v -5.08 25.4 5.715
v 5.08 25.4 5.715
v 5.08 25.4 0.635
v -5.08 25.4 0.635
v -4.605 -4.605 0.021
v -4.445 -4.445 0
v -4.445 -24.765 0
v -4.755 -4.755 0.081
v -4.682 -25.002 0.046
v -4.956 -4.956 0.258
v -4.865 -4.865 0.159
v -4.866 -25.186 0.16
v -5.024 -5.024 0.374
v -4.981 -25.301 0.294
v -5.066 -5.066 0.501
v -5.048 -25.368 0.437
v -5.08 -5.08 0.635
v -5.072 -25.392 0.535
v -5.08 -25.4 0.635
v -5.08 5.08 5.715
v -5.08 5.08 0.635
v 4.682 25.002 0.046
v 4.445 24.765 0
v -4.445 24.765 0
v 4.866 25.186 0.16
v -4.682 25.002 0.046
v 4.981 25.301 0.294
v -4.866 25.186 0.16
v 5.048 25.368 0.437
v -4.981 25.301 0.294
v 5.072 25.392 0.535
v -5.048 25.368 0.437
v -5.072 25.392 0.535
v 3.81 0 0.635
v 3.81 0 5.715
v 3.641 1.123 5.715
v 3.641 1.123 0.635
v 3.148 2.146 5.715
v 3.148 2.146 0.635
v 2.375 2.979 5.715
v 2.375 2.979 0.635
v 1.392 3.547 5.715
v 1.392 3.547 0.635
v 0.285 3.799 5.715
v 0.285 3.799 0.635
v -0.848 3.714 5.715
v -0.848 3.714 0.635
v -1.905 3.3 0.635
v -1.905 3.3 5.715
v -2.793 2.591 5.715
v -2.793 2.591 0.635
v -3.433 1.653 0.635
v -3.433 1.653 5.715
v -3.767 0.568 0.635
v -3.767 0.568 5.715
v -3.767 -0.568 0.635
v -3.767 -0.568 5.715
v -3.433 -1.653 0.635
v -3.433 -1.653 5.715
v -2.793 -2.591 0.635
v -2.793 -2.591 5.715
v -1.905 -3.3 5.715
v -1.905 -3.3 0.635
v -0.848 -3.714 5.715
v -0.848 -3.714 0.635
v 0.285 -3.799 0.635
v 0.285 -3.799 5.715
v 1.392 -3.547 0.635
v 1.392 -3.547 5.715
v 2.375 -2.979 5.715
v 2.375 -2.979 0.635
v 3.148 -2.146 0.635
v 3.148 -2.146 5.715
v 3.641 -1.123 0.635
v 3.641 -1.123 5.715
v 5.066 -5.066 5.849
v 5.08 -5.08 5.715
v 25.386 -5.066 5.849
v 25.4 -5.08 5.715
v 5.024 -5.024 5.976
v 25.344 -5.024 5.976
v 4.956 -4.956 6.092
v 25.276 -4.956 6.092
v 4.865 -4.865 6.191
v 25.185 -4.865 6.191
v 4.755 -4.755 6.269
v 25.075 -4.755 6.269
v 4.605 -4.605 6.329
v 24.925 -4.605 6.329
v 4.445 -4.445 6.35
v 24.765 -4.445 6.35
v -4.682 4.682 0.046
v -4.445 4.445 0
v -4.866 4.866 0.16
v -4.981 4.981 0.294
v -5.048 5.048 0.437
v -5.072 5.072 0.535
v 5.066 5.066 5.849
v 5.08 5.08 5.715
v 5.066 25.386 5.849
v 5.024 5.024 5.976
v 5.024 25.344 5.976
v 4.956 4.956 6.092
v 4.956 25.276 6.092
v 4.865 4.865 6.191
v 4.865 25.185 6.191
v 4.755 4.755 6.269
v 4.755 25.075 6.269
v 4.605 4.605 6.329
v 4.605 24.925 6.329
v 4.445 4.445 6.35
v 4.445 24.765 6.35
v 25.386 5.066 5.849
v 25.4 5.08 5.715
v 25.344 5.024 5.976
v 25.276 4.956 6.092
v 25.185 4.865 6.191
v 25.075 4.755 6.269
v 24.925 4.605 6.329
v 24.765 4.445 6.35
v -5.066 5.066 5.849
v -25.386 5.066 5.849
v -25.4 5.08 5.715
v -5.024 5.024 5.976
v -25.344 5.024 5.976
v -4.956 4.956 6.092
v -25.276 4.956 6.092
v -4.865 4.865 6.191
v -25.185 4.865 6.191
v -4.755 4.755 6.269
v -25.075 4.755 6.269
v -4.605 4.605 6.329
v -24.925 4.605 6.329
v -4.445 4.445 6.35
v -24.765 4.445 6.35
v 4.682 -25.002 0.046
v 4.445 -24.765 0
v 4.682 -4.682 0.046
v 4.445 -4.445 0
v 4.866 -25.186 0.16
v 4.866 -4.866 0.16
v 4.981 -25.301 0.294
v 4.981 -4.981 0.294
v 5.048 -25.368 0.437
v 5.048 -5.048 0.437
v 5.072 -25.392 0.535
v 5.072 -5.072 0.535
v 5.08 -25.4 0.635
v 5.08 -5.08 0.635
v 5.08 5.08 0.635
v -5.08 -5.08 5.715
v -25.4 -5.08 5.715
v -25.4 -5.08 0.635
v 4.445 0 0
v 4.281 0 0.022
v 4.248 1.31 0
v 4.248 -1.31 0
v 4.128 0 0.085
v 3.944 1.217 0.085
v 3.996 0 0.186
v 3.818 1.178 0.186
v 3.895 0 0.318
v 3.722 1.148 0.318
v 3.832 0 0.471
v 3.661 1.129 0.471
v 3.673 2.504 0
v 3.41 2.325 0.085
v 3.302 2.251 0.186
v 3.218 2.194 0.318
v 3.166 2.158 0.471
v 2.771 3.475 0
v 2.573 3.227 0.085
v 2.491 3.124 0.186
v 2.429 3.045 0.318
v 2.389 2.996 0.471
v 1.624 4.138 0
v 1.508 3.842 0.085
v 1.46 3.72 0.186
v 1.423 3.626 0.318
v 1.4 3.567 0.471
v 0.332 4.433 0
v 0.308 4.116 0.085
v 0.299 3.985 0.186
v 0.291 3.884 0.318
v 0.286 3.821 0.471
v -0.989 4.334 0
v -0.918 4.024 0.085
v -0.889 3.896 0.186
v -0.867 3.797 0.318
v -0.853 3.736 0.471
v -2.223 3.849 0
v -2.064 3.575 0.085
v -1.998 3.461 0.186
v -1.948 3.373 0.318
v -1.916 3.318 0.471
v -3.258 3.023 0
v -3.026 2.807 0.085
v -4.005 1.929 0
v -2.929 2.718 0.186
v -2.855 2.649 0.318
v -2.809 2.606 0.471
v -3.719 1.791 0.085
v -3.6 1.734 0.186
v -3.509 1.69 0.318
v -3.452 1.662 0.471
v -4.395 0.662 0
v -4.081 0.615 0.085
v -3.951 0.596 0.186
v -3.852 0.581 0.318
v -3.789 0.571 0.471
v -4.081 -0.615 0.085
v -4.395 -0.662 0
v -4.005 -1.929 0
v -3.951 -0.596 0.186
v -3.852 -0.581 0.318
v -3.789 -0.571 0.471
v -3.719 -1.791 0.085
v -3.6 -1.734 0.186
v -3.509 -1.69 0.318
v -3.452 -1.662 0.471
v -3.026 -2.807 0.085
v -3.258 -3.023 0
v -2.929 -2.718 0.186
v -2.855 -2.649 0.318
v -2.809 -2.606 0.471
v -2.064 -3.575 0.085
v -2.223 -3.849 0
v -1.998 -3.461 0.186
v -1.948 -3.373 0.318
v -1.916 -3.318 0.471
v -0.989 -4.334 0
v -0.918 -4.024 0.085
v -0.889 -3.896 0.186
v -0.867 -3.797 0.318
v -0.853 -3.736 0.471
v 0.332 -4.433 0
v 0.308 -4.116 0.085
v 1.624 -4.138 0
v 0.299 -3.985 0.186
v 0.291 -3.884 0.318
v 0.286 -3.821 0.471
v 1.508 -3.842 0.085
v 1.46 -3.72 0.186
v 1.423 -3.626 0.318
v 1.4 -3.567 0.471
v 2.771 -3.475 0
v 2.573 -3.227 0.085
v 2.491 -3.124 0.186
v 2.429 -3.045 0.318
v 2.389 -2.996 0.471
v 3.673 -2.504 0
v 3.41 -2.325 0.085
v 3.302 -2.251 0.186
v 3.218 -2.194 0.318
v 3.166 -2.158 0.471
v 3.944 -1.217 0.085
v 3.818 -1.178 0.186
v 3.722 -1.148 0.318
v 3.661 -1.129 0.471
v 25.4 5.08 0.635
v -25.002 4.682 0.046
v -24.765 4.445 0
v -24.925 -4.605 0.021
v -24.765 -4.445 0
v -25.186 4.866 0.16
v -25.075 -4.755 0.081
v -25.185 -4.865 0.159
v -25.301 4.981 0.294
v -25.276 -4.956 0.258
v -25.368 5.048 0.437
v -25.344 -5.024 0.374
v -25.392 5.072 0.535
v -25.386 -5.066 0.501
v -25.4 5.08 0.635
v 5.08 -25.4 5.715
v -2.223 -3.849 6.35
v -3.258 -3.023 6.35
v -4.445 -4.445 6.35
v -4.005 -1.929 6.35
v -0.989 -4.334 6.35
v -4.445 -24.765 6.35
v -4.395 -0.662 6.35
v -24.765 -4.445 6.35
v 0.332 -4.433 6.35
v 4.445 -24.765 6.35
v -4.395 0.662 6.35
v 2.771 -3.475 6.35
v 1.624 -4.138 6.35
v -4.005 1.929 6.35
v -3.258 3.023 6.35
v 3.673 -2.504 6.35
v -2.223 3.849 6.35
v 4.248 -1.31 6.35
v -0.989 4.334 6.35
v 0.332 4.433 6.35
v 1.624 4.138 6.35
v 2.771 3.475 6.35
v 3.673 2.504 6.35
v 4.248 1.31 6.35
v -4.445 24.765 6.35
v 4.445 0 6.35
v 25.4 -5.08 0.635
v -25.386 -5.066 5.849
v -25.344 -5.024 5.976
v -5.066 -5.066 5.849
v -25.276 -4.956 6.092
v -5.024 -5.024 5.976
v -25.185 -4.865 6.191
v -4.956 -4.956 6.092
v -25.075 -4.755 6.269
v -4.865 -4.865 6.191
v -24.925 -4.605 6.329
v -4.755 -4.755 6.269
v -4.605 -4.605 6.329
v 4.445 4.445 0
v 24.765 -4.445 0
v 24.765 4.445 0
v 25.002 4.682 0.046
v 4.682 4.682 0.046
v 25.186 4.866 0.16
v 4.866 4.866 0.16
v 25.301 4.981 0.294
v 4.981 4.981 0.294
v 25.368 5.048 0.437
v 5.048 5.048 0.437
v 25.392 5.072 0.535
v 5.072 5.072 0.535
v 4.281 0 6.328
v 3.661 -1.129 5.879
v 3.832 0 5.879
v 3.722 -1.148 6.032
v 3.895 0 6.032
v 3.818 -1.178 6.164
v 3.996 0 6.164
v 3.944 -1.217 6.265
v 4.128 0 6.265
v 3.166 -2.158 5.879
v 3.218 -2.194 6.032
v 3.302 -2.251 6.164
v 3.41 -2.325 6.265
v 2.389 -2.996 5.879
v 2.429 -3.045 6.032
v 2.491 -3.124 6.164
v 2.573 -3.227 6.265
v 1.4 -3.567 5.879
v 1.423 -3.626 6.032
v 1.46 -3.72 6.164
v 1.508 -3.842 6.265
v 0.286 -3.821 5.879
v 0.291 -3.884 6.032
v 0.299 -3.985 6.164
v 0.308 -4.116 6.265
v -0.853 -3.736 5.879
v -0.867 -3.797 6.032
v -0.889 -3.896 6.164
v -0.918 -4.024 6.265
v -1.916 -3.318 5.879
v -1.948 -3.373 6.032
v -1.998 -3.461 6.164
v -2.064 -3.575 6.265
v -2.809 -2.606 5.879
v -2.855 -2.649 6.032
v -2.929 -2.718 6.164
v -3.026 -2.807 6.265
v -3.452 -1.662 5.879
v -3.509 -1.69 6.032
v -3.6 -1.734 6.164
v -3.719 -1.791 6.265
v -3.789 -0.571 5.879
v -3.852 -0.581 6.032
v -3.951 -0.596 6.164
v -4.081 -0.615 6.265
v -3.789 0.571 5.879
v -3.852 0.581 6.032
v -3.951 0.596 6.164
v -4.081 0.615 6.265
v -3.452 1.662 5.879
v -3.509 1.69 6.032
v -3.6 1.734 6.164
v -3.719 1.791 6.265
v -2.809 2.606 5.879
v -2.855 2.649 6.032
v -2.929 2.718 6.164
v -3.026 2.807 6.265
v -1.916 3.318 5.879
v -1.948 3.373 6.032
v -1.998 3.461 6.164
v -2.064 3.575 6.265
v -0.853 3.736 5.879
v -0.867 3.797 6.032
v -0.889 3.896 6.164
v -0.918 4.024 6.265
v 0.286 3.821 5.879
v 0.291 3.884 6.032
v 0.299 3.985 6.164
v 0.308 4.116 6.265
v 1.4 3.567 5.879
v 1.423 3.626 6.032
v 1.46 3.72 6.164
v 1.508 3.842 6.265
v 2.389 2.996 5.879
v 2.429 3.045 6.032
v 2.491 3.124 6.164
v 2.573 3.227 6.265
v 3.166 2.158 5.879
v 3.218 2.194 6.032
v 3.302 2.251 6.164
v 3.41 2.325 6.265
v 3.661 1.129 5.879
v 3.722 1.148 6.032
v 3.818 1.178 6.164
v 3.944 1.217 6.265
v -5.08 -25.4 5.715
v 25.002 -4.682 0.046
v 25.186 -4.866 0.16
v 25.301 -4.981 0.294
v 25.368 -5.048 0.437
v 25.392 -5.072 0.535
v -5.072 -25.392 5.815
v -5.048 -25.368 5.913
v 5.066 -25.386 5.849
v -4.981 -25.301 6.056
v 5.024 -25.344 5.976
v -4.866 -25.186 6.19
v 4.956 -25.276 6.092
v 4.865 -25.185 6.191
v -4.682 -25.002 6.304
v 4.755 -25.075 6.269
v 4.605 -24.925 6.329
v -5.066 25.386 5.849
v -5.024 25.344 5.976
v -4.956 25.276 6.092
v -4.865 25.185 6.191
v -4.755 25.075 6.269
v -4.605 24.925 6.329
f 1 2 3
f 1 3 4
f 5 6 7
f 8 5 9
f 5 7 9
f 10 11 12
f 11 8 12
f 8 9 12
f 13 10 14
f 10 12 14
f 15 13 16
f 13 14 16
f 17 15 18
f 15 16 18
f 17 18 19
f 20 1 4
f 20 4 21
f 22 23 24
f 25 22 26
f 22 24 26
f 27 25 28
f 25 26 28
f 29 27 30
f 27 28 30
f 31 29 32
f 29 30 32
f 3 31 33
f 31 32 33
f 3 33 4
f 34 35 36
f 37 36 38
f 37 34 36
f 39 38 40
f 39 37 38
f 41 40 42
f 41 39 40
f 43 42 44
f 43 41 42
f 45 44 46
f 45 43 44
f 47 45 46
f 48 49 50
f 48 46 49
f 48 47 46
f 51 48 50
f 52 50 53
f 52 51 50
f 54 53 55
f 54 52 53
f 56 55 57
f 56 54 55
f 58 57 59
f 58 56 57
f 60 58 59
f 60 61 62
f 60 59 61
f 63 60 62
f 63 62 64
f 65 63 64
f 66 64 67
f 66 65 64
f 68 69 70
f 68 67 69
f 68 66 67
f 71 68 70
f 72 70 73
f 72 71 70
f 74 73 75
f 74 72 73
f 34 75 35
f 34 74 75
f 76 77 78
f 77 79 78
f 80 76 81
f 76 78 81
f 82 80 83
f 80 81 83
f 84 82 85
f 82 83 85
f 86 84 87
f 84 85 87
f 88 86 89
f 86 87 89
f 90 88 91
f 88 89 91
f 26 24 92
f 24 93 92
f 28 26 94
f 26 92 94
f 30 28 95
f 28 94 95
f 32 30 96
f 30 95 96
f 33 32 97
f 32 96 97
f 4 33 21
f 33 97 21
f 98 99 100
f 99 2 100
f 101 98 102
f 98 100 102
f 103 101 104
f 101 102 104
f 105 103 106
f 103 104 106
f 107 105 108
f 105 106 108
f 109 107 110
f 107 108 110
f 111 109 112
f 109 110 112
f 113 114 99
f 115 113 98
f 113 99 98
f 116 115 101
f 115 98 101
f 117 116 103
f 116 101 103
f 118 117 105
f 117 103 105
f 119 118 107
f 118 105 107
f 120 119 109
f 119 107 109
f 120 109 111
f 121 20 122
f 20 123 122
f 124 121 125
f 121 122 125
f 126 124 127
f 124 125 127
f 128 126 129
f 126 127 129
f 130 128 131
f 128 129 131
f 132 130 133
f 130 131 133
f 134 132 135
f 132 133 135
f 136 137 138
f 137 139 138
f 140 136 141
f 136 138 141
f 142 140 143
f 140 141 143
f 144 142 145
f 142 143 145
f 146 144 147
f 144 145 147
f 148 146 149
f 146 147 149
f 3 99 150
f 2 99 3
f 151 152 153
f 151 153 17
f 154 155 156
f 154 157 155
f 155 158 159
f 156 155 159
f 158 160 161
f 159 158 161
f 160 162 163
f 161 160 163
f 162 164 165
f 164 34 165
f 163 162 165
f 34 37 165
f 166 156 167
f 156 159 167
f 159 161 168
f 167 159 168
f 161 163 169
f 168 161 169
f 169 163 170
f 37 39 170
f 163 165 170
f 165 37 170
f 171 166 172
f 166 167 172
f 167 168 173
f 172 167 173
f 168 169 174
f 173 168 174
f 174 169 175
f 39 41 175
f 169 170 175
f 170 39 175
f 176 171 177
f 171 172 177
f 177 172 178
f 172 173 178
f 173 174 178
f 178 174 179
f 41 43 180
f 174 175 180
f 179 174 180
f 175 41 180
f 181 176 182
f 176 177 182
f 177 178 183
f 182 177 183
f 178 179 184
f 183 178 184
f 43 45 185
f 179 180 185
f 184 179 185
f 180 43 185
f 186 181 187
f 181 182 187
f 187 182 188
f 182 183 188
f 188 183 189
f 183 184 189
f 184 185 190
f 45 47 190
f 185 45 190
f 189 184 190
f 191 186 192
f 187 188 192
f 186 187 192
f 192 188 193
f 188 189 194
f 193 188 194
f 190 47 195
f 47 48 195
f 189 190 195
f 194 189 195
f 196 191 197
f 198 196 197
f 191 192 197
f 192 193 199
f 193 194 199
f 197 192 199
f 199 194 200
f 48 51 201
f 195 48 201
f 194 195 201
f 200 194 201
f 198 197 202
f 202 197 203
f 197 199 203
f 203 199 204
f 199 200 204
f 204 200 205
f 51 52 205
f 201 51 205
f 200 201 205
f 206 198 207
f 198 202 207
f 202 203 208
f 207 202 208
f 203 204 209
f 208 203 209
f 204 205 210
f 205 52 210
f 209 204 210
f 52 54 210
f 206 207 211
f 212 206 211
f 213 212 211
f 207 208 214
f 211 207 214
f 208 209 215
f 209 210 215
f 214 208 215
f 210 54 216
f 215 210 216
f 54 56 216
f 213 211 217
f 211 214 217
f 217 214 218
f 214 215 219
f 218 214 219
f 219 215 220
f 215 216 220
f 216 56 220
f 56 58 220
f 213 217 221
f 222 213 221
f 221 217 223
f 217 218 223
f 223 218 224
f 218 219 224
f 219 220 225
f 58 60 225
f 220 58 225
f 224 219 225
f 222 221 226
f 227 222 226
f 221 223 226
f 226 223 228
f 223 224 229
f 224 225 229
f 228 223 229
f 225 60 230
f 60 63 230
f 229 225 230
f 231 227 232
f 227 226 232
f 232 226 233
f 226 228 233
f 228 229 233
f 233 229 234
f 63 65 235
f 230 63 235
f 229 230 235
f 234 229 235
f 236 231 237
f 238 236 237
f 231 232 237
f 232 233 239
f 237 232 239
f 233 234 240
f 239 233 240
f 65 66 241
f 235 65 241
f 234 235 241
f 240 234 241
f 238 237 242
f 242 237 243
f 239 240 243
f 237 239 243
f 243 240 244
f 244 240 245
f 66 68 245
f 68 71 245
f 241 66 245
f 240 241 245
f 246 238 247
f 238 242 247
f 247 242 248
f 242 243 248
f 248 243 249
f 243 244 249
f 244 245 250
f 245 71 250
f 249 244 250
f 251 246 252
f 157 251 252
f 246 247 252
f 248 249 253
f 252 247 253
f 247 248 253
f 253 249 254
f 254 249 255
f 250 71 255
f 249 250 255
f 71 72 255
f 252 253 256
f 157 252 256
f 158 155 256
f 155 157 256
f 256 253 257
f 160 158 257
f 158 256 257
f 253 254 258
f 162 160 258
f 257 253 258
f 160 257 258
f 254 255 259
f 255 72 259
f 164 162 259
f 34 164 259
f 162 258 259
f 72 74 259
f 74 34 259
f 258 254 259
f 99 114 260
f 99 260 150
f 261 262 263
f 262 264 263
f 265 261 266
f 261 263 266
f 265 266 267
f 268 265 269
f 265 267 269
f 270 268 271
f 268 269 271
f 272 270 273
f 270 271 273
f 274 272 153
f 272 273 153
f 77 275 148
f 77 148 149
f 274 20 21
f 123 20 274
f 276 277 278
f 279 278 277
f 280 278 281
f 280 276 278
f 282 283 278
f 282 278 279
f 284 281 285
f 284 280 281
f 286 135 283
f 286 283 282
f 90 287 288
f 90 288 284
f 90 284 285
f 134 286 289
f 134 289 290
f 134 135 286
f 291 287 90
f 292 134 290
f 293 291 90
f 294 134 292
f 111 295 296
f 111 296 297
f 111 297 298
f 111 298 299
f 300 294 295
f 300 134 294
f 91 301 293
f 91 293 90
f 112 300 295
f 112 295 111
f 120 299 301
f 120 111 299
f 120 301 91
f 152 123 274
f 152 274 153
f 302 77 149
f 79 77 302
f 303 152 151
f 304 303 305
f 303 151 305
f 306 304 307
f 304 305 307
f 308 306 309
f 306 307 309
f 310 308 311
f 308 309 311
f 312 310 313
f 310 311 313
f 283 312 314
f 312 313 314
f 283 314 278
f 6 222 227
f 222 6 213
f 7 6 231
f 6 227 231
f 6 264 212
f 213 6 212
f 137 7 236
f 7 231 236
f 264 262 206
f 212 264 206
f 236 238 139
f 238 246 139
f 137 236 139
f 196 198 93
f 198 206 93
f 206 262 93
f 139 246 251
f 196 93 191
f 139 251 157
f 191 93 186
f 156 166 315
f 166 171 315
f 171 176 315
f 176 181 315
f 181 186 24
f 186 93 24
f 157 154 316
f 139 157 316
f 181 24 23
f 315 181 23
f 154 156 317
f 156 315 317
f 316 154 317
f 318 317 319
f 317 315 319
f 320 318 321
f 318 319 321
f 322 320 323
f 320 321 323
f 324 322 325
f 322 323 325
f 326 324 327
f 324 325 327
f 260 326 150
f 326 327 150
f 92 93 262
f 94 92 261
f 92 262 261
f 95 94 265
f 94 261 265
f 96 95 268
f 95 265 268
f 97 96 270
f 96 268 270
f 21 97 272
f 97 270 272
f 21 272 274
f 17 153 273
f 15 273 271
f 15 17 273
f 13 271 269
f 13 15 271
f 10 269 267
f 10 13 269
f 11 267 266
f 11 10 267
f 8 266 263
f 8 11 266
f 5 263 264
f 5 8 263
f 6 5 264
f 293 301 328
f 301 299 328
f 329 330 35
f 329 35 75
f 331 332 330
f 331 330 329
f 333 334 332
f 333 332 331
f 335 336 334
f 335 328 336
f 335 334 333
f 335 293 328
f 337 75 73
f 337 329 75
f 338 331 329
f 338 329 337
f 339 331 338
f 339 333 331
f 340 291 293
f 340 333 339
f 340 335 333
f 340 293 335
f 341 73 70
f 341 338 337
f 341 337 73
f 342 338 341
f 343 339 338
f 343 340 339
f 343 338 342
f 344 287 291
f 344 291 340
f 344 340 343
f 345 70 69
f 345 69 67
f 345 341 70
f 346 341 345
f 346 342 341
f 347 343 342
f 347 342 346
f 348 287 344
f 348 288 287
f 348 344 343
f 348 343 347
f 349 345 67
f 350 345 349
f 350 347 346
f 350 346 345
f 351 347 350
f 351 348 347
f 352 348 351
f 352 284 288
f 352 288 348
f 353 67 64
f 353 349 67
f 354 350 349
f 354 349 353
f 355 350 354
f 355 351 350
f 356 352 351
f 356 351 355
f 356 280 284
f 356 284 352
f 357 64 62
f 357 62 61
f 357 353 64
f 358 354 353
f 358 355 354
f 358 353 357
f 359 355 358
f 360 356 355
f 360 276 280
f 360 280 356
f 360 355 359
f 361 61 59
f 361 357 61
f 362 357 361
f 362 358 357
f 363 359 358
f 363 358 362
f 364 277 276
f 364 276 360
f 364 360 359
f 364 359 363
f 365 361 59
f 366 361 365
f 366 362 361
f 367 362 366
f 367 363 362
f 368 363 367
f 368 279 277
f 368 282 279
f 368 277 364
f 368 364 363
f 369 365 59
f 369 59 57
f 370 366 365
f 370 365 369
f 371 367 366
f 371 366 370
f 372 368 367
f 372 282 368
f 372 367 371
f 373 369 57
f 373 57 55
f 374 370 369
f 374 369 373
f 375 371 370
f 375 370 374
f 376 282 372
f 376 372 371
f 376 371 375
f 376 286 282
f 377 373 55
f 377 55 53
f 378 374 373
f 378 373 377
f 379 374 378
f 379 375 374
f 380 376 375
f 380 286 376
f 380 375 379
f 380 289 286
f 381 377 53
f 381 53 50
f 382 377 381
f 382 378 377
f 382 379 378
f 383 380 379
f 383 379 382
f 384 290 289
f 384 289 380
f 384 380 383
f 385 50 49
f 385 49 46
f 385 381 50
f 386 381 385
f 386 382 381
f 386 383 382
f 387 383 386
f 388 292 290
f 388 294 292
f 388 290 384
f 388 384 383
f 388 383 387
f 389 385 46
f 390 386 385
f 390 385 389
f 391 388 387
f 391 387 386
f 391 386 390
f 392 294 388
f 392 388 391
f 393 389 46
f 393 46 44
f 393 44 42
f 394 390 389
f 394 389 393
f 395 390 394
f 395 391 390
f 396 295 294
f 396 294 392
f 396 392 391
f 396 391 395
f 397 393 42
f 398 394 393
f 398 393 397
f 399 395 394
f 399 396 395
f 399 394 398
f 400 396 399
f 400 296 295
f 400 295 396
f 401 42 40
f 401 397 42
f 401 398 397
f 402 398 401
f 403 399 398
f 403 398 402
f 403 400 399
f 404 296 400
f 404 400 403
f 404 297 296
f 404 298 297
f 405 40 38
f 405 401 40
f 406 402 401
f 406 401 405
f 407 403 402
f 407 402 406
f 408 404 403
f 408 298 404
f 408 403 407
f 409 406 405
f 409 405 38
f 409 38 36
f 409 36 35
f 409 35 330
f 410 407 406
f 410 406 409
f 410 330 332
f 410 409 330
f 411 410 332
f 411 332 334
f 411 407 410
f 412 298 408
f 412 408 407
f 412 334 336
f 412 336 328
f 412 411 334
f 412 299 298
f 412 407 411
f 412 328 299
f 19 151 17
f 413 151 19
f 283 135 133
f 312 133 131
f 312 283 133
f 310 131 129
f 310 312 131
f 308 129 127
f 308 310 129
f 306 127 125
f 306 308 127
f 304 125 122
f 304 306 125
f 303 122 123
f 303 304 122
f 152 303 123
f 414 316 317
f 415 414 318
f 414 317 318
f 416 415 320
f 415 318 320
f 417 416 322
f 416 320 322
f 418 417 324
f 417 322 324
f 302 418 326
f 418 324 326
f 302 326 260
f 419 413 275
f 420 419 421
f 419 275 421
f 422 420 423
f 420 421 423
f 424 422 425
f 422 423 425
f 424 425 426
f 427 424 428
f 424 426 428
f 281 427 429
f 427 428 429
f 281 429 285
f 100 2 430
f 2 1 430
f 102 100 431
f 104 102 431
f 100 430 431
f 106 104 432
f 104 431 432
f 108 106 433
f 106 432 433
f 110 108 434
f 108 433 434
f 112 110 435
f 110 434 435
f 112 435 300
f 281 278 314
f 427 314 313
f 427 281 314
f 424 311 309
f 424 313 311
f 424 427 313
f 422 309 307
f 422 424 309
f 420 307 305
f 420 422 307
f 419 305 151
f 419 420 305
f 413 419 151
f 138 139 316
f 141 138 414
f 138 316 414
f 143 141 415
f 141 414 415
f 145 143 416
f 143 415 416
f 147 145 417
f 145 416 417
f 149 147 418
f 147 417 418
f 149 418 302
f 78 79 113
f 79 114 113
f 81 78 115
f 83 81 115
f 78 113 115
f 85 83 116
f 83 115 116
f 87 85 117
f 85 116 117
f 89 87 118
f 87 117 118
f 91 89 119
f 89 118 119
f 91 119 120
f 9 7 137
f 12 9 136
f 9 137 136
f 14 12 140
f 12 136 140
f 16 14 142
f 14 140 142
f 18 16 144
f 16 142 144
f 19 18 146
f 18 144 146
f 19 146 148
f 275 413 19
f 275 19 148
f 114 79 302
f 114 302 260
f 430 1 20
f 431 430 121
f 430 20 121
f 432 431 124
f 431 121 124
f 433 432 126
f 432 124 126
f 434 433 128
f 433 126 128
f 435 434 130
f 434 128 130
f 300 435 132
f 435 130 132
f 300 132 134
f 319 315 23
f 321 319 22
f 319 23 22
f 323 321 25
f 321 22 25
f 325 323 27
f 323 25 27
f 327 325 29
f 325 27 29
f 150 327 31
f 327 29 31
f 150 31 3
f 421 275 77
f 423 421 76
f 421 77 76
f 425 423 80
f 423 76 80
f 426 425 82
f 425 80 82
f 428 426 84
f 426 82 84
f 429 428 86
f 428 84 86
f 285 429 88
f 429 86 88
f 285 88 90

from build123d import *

# Parameters (mm, degrees)
F0_R     = 6.35
F0_R_2   = 3.81
F1_DEPTH = 6.35
F2_W     = 1.27
F2_H     = 1.27
F3_DEPTH = 6.35
F4_R     = 0.635


with BuildPart() as f1:
    # F0 (on Top) → F1 (new body)
    with BuildSketch(Plane.XY):
        Circle(F0_R)
        Circle(F0_R_2, mode=Mode.SUBTRACT)
    extrude(amount=F1_DEPTH)

    # F2 (on face) → F3 (join)
    with BuildSketch(Plane.XY.offset(6.35)):
        Polygon((25.4, -5.08), (25.4, 5.08), (5.08, 5.08), (5.08, 3.81), (3.81, 3.81), (3.81, -3.81), (5.08, -3.81), (5.08, -5.08), align=None)
        Polygon((3.81, 5.08), (5.08, 5.08), (5.08, 25.4), (-5.08, 25.4), (-5.08, 5.08), (-3.81, 5.08), (-3.81, 3.81), (3.81, 3.81), align=None)
        with Locations((4.445, 4.445)):
            Rectangle(F2_W, F2_H)
        Polygon((5.08, -25.4), (5.08, -5.08), (3.81, -5.08), (3.81, -3.81), (-3.81, -3.81), (-3.81, -5.08), (-5.08, -5.08), (-5.08, -25.4), align=None)
        with Locations((4.445, -4.445)):
            Rectangle(F2_W, F2_H)
        with Locations((-4.445, 4.445)):
            Rectangle(F2_W, F2_H)
        Polygon((-3.81, -3.81), (-3.81, 3.81), (-5.08, 3.81), (-5.08, 5.08), (-25.4, 5.08), (-25.4, -5.08), (-5.08, -5.08), (-5.08, -3.81), align=None)
        with Locations((-4.445, -4.445)):
            Rectangle(F2_W, F2_H)
    extrude(amount=-F3_DEPTH)

    # F4
    f4_edges = [f1.edges().sort_by_distance(p)[0] for p in [
        (-3.81, 0, 6.35),
        (-3.81, 0, 0),
        (-15.24, -5.08, 0),
        (-5.08, -15.24, 0),
        (0, -25.4, 0),
        (5.08, -15.24, 0),
        (15.24, -5.08, 0),
        (25.4, 0, 0),
        (15.24, 5.08, 0),
        (5.08, 15.24, 0),
        (0, 25.4, 0),
        (-5.08, 15.24, 0),
        (-15.24, 5.08, 0),
        (-25.4, 0, 0),
        (-15.24, -5.08, 6.35),
        (-5.08, -15.24, 6.35),
        (0, -25.4, 6.35),
        (5.08, -15.24, 6.35),
        (15.24, -5.08, 6.35),
        (25.4, 0, 6.35),
        (15.24, 5.08, 6.35),
        (5.08, 15.24, 6.35),
        (0, 25.4, 6.35),
        (-5.08, 15.24, 6.35),
        (-15.24, 5.08, 6.35),
        (-25.4, 0, 6.35),
    ]]
    fillet(f4_edges, radius=F4_R)


solid = f1.part
